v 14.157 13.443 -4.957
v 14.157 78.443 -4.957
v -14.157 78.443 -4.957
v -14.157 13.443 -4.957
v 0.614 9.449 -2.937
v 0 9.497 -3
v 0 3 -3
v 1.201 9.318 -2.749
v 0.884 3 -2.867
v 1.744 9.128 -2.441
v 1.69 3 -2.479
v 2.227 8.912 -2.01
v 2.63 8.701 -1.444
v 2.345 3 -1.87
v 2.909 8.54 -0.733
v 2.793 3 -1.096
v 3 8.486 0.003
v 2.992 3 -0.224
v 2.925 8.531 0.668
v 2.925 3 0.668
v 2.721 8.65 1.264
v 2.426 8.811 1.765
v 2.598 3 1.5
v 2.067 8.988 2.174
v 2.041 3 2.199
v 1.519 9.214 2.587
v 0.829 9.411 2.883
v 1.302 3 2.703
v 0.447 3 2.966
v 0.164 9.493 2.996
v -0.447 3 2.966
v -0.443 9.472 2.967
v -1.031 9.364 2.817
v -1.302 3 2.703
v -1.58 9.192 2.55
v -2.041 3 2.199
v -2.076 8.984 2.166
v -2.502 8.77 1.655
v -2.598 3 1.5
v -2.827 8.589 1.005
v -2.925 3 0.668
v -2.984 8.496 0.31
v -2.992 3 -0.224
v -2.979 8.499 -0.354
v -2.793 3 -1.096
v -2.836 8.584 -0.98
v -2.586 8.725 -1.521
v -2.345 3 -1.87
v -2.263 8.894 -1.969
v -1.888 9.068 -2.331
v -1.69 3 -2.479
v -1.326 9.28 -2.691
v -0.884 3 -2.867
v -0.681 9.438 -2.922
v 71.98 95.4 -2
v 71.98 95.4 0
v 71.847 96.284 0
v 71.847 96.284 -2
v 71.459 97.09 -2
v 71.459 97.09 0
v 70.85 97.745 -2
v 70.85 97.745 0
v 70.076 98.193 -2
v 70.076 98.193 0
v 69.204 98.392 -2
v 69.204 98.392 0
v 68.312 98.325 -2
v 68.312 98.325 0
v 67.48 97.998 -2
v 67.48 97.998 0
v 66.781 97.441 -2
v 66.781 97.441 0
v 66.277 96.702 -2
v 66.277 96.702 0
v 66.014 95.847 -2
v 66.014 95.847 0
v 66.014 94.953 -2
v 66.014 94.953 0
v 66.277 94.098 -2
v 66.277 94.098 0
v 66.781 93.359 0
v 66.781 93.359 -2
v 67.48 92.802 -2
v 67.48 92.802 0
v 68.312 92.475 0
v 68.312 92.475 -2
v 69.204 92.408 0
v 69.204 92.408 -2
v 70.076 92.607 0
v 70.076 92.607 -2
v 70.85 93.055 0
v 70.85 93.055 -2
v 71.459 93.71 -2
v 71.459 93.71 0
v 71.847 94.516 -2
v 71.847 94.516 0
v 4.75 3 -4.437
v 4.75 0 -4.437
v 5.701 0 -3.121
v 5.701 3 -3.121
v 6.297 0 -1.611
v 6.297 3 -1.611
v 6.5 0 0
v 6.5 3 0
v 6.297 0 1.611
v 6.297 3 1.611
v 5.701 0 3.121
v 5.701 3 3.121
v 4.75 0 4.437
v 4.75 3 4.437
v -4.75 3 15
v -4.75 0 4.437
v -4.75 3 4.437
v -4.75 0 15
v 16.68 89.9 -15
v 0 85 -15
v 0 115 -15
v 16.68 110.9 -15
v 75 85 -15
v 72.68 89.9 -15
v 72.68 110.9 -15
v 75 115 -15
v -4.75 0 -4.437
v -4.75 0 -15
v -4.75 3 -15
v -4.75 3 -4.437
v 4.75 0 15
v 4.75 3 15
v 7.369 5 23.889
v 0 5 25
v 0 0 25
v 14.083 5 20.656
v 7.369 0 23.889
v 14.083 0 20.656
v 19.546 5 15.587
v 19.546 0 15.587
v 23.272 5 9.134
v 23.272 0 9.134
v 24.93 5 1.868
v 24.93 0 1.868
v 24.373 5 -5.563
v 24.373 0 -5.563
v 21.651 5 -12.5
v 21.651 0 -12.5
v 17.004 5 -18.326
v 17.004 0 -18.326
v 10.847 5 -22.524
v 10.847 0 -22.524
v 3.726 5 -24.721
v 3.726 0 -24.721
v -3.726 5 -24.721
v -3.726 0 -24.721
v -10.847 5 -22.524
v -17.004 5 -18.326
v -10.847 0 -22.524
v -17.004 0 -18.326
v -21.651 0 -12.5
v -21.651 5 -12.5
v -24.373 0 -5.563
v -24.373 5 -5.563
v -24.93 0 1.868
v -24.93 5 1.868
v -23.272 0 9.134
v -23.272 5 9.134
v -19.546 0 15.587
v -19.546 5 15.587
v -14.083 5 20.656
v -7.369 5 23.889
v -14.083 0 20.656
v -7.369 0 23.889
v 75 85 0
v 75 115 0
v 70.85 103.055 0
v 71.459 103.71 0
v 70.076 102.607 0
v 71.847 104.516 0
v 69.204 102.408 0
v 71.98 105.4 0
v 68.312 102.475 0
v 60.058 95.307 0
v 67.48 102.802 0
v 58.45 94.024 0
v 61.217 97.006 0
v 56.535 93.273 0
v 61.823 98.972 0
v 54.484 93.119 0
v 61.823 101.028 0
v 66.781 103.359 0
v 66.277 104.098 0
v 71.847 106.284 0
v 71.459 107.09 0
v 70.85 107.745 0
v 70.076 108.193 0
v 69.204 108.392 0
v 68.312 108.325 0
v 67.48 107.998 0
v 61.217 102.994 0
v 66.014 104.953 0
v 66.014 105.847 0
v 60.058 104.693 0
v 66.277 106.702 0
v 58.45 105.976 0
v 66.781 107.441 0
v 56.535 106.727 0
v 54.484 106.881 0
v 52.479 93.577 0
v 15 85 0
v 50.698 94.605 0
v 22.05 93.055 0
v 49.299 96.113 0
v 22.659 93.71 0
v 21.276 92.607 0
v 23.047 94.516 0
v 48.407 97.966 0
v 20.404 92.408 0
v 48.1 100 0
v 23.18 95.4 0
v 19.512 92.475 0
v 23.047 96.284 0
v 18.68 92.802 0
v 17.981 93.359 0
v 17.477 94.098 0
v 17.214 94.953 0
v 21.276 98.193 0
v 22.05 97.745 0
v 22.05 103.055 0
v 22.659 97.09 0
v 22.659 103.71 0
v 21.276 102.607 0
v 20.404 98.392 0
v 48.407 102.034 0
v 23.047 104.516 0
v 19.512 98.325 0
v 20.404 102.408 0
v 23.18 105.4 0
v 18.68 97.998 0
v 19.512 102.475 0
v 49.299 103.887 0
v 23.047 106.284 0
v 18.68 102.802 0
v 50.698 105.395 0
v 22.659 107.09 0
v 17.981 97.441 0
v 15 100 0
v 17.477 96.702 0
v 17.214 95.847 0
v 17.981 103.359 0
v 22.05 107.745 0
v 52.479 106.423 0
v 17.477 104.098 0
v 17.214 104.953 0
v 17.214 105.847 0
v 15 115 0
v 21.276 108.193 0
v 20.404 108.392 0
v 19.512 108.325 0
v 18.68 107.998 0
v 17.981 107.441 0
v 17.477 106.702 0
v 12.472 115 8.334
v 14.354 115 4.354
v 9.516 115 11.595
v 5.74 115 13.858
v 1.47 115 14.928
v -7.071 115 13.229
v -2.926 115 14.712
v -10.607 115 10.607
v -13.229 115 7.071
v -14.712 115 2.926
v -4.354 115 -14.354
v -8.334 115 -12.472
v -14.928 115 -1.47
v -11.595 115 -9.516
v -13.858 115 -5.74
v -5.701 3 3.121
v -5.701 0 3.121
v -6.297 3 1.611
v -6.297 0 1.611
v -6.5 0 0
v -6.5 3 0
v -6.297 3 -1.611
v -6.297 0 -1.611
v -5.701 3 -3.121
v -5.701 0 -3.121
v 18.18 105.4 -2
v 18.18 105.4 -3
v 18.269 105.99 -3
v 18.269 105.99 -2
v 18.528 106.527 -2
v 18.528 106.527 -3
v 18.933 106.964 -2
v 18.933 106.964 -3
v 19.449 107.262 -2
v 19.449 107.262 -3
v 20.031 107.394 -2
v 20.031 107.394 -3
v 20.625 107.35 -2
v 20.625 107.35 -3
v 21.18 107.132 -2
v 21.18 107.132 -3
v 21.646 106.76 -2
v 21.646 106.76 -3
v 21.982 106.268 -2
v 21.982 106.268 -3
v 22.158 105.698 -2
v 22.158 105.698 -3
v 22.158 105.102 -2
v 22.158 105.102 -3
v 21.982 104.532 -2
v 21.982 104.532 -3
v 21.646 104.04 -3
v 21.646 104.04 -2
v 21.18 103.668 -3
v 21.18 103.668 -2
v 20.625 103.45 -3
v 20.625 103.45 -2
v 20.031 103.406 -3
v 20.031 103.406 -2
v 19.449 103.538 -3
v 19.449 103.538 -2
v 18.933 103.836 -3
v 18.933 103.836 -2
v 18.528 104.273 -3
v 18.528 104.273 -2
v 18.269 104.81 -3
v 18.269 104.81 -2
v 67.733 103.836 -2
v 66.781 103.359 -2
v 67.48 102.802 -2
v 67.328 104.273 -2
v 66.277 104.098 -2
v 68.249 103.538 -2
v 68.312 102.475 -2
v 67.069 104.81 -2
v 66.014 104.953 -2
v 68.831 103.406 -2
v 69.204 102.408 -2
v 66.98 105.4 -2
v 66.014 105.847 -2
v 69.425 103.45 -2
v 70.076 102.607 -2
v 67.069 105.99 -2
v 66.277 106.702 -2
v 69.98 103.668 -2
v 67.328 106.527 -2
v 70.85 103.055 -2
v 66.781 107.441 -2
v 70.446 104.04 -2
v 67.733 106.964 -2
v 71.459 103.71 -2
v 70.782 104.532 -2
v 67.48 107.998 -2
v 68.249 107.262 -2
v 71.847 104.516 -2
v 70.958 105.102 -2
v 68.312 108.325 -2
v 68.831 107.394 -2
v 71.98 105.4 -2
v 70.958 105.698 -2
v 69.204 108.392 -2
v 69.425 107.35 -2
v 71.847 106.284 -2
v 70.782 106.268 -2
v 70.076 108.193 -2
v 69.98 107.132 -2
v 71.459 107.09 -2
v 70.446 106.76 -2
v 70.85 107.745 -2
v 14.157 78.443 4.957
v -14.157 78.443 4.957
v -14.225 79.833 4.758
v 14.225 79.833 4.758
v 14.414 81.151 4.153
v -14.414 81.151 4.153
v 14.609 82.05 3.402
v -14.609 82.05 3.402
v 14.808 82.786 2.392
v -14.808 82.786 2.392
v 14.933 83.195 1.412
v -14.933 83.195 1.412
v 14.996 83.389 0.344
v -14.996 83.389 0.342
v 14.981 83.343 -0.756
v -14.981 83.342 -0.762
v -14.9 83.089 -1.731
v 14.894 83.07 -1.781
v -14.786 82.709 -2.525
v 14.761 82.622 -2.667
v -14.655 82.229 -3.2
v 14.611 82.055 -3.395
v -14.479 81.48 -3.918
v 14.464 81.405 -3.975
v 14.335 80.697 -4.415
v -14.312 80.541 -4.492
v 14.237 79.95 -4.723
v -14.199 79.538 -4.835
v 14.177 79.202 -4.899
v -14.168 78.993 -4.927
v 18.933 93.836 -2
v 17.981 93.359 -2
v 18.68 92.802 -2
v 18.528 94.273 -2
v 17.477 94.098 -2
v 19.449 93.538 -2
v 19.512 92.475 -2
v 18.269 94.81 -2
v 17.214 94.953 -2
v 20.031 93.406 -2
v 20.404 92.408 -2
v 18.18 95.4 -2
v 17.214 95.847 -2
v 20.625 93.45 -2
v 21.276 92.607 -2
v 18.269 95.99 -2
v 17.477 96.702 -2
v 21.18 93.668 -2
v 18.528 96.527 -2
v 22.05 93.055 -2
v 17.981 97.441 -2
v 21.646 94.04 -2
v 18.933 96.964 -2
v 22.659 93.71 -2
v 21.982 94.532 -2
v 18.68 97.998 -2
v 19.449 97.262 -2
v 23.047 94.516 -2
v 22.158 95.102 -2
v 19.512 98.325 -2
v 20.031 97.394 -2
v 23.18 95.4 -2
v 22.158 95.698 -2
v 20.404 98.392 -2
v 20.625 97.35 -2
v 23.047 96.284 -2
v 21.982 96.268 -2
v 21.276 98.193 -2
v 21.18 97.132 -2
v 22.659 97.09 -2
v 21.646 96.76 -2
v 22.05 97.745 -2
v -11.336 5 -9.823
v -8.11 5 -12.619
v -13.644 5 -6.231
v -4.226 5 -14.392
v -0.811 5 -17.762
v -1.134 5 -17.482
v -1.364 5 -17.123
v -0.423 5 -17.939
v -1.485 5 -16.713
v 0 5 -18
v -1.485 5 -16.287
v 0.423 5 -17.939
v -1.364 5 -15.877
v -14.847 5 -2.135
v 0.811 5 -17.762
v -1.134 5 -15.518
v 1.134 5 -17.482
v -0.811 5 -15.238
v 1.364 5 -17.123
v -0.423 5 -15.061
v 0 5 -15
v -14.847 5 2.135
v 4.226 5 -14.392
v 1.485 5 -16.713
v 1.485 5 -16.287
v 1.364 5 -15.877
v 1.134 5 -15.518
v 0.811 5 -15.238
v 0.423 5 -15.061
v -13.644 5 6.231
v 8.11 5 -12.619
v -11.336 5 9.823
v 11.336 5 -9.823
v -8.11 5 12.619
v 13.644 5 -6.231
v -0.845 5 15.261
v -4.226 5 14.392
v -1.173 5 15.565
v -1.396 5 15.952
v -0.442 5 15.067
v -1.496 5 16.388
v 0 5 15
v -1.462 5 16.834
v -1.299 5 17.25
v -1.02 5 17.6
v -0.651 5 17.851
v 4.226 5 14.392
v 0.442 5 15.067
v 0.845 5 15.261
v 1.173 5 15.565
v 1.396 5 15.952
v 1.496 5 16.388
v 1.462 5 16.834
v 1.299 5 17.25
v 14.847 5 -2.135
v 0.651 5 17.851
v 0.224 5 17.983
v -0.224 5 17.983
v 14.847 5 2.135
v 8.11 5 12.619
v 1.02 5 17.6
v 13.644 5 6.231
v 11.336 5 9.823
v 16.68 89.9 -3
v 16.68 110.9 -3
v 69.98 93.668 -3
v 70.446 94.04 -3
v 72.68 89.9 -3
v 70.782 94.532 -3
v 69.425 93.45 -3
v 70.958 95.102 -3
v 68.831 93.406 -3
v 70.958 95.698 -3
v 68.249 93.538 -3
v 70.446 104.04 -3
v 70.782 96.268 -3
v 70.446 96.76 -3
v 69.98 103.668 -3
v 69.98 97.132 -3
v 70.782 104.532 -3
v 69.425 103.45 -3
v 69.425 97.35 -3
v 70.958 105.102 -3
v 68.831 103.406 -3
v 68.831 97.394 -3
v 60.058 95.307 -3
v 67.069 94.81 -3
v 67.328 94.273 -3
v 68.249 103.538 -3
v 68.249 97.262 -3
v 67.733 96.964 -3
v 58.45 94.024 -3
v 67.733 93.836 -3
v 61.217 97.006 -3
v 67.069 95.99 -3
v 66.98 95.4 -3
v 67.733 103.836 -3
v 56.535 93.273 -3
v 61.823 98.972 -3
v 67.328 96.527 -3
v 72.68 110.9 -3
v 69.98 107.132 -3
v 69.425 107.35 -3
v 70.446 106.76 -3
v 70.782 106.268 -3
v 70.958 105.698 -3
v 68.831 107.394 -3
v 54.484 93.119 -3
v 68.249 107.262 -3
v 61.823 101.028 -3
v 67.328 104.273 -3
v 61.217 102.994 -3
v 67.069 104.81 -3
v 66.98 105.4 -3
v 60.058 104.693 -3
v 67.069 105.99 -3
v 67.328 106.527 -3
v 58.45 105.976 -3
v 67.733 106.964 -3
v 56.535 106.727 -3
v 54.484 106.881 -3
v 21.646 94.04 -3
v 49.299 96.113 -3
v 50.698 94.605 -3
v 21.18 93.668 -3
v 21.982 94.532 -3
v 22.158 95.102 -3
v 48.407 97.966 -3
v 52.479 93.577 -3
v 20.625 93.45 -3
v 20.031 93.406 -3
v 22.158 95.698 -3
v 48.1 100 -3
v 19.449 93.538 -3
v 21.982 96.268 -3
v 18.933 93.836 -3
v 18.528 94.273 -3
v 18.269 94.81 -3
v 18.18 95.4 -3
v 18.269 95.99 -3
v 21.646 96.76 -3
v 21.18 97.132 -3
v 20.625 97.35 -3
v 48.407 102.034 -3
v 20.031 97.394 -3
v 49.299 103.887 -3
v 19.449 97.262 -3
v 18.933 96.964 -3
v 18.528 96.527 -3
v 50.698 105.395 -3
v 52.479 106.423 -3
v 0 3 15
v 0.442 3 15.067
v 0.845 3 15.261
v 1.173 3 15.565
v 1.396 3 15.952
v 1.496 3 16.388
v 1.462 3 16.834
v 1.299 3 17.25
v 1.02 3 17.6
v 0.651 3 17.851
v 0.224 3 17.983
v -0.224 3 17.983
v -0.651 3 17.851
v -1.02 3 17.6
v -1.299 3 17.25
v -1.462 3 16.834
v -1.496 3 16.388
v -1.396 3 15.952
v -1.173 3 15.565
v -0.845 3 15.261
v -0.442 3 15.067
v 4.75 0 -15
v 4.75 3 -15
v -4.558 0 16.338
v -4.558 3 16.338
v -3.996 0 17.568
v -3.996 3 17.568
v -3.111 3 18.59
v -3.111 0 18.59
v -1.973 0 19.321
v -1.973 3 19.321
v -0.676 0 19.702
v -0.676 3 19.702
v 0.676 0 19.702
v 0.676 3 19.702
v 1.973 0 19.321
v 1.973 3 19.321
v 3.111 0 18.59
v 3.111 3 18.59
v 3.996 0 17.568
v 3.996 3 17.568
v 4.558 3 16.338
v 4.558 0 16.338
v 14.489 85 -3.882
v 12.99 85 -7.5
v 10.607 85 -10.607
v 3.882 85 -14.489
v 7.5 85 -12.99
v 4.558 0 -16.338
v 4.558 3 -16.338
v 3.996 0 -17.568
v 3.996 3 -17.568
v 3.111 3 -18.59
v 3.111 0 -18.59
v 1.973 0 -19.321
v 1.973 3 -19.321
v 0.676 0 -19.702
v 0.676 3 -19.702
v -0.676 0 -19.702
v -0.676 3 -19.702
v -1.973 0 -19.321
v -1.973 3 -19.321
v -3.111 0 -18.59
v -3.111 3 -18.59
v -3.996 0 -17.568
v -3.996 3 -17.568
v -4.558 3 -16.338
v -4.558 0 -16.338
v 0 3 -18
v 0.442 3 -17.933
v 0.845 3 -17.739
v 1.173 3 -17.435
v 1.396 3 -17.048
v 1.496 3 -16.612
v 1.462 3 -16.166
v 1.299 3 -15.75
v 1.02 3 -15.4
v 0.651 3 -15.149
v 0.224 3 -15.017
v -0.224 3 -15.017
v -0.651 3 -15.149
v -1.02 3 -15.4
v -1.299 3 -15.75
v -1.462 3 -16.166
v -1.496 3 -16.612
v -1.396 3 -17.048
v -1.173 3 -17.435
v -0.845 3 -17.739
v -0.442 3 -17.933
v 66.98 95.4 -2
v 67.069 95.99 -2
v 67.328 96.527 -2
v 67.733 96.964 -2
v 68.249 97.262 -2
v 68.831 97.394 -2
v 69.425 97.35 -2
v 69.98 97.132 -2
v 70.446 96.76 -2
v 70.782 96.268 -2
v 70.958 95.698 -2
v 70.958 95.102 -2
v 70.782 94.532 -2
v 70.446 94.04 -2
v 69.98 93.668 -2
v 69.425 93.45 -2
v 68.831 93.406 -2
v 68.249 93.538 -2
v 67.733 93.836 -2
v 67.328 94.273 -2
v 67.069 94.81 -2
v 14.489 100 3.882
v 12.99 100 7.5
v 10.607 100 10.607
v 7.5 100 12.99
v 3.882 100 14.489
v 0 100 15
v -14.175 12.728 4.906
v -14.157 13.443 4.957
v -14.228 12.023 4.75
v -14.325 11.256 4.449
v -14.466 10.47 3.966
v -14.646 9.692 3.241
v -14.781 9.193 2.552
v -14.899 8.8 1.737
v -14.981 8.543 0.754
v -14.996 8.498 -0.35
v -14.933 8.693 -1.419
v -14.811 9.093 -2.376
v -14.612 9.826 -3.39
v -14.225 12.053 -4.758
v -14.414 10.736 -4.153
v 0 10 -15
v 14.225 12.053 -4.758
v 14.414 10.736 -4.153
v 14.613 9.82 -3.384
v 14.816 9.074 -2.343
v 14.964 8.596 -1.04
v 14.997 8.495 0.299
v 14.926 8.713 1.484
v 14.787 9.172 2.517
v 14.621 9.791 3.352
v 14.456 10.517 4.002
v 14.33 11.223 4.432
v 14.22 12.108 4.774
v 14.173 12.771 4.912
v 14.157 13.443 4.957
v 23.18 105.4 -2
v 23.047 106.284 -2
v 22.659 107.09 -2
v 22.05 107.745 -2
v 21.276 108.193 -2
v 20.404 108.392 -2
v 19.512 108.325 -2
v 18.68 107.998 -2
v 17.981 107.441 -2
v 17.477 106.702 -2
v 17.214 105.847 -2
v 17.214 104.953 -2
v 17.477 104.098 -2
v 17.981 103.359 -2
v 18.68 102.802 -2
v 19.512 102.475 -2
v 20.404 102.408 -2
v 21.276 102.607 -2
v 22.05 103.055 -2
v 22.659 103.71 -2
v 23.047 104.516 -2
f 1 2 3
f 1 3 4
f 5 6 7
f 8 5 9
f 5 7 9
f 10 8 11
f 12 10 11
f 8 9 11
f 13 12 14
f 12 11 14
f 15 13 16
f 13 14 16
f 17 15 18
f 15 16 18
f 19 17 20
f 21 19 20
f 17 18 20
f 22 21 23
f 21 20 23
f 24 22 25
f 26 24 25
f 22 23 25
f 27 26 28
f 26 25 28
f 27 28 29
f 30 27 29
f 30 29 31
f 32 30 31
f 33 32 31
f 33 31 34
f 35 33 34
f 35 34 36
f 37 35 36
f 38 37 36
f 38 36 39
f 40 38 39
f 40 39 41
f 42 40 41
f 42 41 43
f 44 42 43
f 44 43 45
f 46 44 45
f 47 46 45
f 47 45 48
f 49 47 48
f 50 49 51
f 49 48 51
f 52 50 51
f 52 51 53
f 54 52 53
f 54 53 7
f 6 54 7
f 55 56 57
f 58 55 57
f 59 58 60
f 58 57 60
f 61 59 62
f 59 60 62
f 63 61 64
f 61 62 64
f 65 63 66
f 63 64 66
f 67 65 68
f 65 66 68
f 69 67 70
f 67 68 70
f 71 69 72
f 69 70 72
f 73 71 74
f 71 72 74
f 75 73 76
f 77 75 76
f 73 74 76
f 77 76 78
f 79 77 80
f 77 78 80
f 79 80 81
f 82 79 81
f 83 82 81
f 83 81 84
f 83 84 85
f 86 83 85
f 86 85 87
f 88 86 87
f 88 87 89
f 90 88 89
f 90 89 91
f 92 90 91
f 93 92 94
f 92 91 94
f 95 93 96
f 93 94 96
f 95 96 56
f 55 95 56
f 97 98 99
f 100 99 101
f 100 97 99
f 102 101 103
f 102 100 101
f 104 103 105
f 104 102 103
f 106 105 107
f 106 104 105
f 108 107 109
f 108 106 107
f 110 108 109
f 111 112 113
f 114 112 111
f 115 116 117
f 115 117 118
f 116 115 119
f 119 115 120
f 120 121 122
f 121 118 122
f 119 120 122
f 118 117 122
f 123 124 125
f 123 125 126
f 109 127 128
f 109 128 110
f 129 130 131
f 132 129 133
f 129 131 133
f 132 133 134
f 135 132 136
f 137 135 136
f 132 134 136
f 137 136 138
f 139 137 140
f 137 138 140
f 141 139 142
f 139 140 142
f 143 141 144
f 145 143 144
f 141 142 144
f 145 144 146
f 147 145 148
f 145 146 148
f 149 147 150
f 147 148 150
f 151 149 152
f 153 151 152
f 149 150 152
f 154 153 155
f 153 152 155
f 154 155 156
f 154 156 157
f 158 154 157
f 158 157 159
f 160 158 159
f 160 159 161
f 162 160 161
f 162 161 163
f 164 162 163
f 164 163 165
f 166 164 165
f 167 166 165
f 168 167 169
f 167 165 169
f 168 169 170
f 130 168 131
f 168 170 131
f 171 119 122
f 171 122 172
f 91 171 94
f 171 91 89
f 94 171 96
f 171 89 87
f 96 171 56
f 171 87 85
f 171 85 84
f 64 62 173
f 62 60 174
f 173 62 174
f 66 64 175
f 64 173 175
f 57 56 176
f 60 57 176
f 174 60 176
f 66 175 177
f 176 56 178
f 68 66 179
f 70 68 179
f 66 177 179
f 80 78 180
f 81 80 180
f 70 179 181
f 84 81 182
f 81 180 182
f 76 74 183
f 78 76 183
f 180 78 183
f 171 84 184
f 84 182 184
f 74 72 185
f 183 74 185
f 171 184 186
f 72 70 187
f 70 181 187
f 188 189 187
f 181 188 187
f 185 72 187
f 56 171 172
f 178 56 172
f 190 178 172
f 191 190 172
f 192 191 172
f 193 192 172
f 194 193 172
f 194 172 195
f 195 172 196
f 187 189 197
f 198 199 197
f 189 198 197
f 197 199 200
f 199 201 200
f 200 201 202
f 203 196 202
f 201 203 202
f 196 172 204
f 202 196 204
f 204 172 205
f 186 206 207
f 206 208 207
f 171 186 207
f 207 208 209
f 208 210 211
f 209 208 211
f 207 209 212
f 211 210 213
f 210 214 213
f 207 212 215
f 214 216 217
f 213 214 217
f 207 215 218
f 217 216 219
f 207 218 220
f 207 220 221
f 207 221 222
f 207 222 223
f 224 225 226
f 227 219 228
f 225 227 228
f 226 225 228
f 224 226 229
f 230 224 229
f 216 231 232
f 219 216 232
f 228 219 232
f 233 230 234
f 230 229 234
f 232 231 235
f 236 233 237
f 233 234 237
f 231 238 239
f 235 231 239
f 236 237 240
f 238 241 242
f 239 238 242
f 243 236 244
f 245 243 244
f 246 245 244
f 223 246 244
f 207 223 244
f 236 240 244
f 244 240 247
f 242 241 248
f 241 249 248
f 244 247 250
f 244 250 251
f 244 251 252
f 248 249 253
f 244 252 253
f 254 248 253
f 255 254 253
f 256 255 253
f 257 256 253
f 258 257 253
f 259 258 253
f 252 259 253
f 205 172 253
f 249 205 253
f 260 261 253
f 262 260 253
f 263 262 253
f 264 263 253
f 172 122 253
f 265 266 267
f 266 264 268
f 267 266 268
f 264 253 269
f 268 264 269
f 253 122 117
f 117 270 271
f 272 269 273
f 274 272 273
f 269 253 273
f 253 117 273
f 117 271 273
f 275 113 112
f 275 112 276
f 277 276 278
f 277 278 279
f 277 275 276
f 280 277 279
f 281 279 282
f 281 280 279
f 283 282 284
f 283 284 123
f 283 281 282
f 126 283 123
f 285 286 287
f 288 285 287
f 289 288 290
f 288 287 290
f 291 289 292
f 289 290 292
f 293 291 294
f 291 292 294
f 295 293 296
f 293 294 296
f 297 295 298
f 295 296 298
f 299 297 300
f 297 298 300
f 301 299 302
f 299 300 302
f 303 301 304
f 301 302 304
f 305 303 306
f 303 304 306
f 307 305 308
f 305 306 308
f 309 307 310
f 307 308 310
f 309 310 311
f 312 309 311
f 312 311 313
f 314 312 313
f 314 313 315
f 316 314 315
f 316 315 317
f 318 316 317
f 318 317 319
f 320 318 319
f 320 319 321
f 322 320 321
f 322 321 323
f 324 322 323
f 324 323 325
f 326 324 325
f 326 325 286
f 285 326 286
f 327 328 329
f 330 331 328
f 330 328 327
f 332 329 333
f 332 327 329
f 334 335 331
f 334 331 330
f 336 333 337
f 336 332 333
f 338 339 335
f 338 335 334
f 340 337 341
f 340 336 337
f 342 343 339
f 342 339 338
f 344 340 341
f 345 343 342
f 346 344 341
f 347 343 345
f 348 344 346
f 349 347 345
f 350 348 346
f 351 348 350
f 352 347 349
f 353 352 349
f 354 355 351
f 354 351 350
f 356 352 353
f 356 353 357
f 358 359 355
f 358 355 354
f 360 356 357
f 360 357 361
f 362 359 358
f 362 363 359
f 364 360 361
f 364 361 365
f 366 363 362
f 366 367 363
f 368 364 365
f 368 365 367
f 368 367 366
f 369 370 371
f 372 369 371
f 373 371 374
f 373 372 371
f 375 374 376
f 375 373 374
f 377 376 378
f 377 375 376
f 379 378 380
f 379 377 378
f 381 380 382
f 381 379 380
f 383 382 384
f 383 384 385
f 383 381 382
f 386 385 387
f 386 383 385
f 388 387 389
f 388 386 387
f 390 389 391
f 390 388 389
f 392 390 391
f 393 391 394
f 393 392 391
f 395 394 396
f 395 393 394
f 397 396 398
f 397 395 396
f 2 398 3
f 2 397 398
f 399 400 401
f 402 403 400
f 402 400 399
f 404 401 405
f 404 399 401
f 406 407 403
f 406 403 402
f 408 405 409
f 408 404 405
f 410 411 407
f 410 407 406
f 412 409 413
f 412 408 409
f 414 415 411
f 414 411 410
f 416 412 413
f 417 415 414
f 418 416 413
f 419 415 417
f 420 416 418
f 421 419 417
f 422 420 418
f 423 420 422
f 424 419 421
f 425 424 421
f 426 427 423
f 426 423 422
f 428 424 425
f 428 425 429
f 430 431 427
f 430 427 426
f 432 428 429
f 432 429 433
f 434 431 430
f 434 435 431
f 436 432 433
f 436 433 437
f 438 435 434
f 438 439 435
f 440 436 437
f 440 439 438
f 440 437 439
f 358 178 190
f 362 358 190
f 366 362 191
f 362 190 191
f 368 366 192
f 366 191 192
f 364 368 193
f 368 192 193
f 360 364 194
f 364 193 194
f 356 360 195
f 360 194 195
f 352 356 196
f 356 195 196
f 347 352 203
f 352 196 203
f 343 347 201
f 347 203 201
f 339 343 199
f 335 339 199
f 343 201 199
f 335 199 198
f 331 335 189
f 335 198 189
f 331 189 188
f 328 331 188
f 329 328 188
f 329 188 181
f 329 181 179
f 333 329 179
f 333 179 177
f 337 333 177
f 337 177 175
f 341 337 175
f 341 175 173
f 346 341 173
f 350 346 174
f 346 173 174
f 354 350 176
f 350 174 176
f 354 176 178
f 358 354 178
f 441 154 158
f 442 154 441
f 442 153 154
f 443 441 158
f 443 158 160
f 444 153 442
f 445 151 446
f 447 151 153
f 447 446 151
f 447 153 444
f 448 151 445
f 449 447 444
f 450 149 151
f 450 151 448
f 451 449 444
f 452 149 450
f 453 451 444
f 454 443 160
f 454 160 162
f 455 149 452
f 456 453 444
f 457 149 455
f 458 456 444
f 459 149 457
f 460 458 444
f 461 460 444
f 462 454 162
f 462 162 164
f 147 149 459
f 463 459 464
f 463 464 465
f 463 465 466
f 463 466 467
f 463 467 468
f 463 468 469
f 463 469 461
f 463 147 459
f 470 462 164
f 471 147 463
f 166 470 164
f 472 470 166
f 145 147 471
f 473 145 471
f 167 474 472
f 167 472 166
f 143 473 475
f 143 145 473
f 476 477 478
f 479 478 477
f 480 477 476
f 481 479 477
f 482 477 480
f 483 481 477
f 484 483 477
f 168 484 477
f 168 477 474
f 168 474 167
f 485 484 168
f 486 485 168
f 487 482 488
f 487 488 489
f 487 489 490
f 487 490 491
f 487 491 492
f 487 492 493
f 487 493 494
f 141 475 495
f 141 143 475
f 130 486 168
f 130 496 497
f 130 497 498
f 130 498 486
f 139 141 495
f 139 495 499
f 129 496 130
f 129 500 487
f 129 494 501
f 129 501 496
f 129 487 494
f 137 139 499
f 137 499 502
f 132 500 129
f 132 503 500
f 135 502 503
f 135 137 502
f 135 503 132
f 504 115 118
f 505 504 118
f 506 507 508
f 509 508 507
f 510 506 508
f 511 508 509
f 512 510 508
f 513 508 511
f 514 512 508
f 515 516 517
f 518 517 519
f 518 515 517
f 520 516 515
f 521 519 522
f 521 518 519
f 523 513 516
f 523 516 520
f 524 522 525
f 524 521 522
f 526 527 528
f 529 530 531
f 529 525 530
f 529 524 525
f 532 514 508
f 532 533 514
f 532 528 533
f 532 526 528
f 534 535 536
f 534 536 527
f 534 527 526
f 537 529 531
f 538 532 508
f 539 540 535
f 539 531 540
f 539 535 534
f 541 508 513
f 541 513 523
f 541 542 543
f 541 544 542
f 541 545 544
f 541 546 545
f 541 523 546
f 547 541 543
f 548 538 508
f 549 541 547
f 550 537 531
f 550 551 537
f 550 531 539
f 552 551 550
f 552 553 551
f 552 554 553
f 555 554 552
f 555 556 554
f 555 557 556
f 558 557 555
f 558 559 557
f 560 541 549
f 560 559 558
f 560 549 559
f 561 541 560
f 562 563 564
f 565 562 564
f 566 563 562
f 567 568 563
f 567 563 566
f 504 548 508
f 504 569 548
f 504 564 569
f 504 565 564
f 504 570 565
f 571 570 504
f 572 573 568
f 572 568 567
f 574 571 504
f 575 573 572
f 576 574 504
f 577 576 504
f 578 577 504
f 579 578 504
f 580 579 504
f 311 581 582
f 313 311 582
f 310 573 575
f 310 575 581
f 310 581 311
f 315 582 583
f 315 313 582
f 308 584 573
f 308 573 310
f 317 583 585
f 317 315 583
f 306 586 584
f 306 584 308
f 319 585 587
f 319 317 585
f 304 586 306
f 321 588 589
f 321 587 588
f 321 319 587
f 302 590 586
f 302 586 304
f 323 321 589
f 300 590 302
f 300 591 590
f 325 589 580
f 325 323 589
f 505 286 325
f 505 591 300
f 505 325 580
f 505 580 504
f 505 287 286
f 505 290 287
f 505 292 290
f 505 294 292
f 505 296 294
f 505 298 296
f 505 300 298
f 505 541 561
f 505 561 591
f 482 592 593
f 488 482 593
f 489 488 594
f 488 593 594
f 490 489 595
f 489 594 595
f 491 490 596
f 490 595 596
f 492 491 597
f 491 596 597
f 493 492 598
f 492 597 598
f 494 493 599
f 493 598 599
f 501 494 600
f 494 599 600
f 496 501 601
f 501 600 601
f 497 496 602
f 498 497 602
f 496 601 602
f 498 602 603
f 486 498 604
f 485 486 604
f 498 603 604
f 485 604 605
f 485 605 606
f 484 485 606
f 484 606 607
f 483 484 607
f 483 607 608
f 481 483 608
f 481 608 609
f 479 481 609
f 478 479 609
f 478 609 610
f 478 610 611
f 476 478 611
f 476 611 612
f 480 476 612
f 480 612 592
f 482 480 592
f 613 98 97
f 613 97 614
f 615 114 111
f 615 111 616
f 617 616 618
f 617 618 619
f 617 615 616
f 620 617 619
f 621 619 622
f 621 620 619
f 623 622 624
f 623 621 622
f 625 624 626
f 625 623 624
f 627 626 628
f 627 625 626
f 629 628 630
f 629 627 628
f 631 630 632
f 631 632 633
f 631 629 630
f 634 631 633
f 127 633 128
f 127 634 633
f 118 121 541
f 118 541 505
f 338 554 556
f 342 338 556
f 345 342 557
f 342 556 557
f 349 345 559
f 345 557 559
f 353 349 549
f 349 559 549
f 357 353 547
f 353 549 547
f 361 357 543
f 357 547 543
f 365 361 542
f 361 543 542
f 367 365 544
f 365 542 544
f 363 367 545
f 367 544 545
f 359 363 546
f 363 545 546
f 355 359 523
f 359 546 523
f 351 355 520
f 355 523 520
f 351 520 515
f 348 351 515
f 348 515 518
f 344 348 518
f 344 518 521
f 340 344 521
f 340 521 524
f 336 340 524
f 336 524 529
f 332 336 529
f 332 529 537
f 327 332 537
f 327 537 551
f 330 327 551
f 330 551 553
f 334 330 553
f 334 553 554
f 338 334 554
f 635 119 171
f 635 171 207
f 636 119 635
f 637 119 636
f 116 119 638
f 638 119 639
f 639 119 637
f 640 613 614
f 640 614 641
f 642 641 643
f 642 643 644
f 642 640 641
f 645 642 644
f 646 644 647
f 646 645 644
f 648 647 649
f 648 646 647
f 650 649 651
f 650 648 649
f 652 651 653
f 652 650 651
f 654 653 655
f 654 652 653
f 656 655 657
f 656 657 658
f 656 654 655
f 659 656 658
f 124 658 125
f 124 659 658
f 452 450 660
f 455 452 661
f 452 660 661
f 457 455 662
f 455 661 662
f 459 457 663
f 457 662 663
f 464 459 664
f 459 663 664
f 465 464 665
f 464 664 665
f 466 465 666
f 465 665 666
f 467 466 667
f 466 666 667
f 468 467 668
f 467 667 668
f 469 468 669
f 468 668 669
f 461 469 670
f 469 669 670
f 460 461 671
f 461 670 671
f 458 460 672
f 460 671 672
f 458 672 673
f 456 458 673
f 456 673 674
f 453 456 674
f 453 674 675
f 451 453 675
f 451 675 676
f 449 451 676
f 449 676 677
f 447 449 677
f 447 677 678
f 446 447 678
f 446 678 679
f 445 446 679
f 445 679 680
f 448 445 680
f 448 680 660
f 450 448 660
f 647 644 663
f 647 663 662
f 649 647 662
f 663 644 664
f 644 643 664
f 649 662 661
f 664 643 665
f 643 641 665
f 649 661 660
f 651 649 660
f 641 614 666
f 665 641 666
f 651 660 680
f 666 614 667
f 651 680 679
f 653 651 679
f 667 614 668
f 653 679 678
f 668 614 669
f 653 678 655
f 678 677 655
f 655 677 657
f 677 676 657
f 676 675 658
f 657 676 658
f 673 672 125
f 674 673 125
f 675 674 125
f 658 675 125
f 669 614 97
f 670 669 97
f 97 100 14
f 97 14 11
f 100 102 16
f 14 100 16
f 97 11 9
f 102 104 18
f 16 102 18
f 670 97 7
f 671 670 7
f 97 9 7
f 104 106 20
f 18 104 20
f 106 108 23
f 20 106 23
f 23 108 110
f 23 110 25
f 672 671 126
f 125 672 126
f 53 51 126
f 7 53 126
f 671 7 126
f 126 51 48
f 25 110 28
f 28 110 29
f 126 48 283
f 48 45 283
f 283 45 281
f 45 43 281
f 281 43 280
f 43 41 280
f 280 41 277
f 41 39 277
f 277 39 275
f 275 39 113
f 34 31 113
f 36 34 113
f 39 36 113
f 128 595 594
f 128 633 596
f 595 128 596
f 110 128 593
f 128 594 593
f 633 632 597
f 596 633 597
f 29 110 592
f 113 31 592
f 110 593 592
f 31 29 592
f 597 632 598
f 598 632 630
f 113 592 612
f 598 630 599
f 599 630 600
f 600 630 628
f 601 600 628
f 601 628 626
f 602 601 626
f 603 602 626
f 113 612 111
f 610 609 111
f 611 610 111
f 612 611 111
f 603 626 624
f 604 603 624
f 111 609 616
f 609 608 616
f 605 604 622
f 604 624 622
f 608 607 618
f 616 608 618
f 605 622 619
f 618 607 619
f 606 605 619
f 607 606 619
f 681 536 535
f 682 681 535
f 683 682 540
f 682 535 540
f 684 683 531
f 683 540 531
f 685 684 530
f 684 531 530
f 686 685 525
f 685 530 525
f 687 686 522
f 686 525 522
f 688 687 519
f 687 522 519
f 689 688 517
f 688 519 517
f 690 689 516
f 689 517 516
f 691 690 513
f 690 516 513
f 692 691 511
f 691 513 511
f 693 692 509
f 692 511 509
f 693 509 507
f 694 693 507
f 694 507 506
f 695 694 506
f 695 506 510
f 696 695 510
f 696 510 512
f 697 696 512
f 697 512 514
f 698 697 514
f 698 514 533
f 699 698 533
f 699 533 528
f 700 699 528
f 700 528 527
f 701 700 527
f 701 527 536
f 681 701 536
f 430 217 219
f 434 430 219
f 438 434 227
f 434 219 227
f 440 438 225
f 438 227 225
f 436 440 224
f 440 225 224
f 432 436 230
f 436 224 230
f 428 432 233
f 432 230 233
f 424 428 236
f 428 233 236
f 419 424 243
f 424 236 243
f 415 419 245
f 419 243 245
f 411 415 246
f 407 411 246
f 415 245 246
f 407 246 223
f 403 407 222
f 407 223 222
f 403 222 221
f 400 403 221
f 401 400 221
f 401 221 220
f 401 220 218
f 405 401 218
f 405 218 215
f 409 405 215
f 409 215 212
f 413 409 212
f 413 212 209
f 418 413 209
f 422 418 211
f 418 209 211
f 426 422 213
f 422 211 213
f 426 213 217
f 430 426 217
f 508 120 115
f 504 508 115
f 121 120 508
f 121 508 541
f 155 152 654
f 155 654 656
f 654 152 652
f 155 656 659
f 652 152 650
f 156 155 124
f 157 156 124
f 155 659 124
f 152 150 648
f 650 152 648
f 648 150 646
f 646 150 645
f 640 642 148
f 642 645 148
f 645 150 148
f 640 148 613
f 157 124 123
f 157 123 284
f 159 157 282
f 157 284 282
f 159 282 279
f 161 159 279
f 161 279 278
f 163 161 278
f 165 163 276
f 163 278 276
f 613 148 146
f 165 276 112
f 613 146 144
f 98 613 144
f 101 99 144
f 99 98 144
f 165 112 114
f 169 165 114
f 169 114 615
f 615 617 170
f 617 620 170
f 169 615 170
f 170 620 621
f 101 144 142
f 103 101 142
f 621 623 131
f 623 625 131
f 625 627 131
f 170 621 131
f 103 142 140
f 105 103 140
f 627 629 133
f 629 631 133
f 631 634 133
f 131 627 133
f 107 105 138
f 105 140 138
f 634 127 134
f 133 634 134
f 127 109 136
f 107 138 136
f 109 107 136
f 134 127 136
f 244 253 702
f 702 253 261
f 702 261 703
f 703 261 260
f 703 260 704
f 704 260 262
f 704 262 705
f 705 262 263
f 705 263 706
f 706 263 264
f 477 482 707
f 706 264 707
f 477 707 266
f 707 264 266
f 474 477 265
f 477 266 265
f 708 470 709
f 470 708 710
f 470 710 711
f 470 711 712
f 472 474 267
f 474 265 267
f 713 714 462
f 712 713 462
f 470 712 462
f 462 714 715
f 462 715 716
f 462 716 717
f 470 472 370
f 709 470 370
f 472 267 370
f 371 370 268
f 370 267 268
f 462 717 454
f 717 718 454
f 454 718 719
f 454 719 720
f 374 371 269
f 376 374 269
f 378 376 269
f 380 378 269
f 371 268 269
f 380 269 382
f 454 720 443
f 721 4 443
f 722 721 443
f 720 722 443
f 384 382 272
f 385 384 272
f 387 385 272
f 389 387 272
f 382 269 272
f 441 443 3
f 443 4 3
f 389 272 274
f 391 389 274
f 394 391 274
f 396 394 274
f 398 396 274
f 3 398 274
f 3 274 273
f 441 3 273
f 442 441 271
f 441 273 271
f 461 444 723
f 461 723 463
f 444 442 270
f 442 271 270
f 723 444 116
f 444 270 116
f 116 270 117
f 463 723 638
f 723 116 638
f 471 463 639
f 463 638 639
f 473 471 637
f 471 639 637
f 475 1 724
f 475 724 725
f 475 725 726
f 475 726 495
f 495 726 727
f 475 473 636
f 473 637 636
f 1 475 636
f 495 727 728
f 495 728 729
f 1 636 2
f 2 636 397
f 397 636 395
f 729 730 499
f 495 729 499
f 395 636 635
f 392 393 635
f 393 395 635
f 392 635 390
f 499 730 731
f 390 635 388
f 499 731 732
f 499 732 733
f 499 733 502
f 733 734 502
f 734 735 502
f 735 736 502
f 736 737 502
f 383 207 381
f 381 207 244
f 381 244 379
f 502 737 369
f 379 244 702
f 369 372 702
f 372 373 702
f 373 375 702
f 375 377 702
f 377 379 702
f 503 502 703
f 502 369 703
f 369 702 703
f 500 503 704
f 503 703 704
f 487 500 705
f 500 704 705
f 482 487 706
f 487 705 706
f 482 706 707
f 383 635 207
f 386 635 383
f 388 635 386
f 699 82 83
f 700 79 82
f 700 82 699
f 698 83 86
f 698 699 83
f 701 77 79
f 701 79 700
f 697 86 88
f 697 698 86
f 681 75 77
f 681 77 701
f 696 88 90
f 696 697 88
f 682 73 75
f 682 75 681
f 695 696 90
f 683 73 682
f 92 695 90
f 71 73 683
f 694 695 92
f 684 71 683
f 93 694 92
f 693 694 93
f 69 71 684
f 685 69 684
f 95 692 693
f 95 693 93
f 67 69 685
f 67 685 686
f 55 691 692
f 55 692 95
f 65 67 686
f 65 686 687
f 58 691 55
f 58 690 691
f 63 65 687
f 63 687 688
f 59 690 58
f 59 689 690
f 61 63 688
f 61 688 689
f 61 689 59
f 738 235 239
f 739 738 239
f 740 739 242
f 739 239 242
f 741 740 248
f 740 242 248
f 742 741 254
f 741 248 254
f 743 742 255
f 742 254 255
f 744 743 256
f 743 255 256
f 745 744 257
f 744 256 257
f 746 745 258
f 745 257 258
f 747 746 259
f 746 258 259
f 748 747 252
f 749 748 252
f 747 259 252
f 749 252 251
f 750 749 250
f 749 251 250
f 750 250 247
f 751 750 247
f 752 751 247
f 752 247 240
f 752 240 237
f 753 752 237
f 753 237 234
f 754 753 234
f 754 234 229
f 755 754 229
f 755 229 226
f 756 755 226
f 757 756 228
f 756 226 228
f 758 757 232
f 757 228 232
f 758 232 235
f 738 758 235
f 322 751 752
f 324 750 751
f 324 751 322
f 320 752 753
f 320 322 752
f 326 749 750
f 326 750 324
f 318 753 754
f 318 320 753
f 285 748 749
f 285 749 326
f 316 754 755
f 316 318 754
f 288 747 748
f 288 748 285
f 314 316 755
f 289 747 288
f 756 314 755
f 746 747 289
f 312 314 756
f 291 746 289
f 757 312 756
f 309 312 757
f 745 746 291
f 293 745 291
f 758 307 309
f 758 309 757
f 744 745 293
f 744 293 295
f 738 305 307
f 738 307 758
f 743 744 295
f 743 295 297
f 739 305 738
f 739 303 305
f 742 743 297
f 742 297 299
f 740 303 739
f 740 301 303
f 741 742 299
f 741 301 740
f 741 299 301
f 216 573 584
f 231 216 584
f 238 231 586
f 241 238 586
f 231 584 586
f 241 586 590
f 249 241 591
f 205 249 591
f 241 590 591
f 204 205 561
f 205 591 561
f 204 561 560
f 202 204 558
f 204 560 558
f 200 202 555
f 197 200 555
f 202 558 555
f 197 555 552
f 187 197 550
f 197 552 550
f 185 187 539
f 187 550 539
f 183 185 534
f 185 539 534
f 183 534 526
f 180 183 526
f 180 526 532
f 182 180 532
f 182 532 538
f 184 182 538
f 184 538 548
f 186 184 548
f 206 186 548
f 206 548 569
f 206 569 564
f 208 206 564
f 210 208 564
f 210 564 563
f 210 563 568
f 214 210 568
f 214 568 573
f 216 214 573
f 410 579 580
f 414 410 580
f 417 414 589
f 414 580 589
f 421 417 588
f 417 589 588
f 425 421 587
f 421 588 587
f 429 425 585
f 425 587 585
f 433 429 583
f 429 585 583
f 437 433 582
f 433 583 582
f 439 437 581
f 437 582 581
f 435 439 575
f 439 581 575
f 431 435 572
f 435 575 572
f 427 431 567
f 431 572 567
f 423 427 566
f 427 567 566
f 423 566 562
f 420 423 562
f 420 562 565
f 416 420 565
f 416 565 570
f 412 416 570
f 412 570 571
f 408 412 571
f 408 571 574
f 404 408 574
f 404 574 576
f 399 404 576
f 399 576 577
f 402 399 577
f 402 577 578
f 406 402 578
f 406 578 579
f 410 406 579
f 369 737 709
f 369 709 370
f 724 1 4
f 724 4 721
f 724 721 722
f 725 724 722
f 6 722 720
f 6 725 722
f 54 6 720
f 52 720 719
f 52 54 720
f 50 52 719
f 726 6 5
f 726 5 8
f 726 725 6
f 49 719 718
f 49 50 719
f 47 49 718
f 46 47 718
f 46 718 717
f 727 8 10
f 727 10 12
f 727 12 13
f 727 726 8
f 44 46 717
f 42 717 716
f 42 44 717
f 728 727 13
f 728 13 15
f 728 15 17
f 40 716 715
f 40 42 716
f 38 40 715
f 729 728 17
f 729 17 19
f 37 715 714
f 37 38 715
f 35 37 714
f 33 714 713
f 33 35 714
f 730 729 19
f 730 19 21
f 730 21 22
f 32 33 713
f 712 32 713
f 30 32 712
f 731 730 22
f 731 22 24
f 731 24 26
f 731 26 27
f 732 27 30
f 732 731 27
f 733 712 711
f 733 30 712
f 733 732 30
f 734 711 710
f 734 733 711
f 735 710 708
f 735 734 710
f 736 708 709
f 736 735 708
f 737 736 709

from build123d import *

# Parameters (mm, degrees)
SKETCH1_R           = 25
BOSS_EXTRUDE1_DEPTH = 5
SKETCH2_R           = 15
BOSS_EXTRUDE2_DEPTH = 95
BOSS_EXTRUDE4_DEPTH = 15
CUT_EXTRUDE1_DEPTH  = 20
SKETCH15_W          = 56
SKETCH15_H          = 21
CUT_EXTRUDE3_DEPTH  = 12
SKETCH17_R          = 2
SKETCH17_R_2        = 6.9
CUT_EXTRUDE4_DEPTH  = 5
SKETCH20_R          = 3
CUT_EXTRUDE5_DEPTH  = 2
SKETCH22_R          = 3
SKETCH22_R_2        = 1.5
CUT_EXTRUDE6_DEPTH  = 10
CUT_EXTRUDE7_DEPTH  = 3
SKETCH24_R          = 6.5
CUT_EXTRUDE8_DEPTH  = 3


with BuildPart() as part:
    # Sketch1 → Boss-Extrude1 (new body)
    with BuildSketch(Plane(origin=(0, 0, 0), x_dir=(1, 0, 0), z_dir=(0, 1, 0))):
        with Locations(Location((0, 0, 0), (0, 0, 270))):
            Circle(SKETCH1_R)
    extrude(amount=BOSS_EXTRUDE1_DEPTH)

    # Sketch2 → Boss-Extrude2 (add)
    with BuildSketch(Plane(origin=(0, 5, 0), x_dir=(1, 0, 0), z_dir=(0, 1, 0))):
        with Locations(Location((0, 0, 0), (0, 0, 270))):
            Circle(SKETCH2_R)
    extrude(amount=BOSS_EXTRUDE2_DEPTH)

    # Sketch5 → Boss-Extrude4 (add, symmetric)
    with BuildSketch(Plane(origin=(0, 100, 0), x_dir=(1, 0, 0), z_dir=(0, 1, 0))):
        with BuildLine():
            Line((75, 0), (15, 0))
            ThreePointArc((15, 0), (-10.606601718, -10.606601718), (0, 15))
            Line((0, 15), (75, 15))
            Line((75, 15), (75, 0))
        make_face()
    extrude(amount=BOSS_EXTRUDE4_DEPTH, both=True)

    # Sketch13 → Cut-Extrude1 (cut, symmetric)
    with BuildSketch(Plane(origin=(0, 0, 0), x_dir=(0, 0, -1), z_dir=(1, 0, 0))):
        with BuildLine():
            Line((4.957382287, 78.443263872), (4.957382287, 13.443263872))
            ThreePointArc((4.957382287, 13.443263872), (0, 8.485881586), (-4.957382287, 13.443263872))
            Line((-4.957382287, 13.443263872), (-4.957382287, 78.443263872))
            ThreePointArc((-4.957382287, 78.443263872), (0, 83.400646159), (4.957382287, 78.443263872))
        make_face()
    extrude(amount=CUT_EXTRUDE1_DEPTH, both=True, mode=Mode.SUBTRACT)

    # Sketch15 → Cut-Extrude3 (cut)
    with BuildSketch(Plane(origin=(0, 0, -15), x_dir=(-1, 0, 0), z_dir=(0, 0, -1))):
        with Locations((-44.68, 100.4)):
            Rectangle(SKETCH15_W, SKETCH15_H)
    extrude(amount=-CUT_EXTRUDE3_DEPTH, mode=Mode.SUBTRACT)

    # Sketch17 → Cut-Extrude4 (cut)
    with BuildSketch(Plane(origin=(0, 0, -3), x_dir=(-1, 0, 0), z_dir=(0, 0, -1))):
        with Locations((-68.98, 105.4)):
            Circle(SKETCH17_R)
        with Locations((-68.98, 95.4)):
            Circle(SKETCH17_R)
        with Locations((-20.18, 105.4)):
            Circle(SKETCH17_R)
        with Locations((-20.18, 95.4)):
            Circle(SKETCH17_R)
        with Locations((-55, 100)):
            Circle(SKETCH17_R_2)
    extrude(amount=-CUT_EXTRUDE4_DEPTH, mode=Mode.SUBTRACT)

    # Sketch20 → Cut-Extrude5 (cut)
    with BuildSketch(Plane.XY):
        with Locations((20.18, 105.4)):
            Circle(SKETCH20_R)
        with Locations((20.18, 95.4)):
            Circle(SKETCH20_R)
        with Locations((68.98, 105.4)):
            Circle(SKETCH20_R)
        with Locations((68.98, 95.4)):
            Circle(SKETCH20_R)
    extrude(amount=-CUT_EXTRUDE5_DEPTH, mode=Mode.SUBTRACT)

    # Sketch22 → Cut-Extrude6 (cut)
    with BuildSketch(Plane.XZ):
        with Locations(Location((0, 0, 0), (0, 0, 270))):
            Circle(SKETCH22_R)
        with Locations(Location((0, 16.5, 0), (0, 0, 270))):
            Circle(SKETCH22_R_2)
        with Locations(Location((0, -16.5, 0), (0, 0, 270))):
            Circle(SKETCH22_R_2)
    extrude(amount=-CUT_EXTRUDE6_DEPTH, mode=Mode.SUBTRACT)

    # Sketch23 → Cut-Extrude7 (cut)
    with BuildSketch(Plane.XZ):
        with BuildLine():
            Line((4.75, 15), (4.75, -15))
            ThreePointArc((4.75, -15), (0, -19.75), (-4.75, -15))
            Line((-4.75, -15), (-4.75, 15))
            ThreePointArc((-4.75, 15), (0, 19.75), (4.75, 15))
        make_face()
    extrude(amount=-CUT_EXTRUDE7_DEPTH, mode=Mode.SUBTRACT)

    # Sketch24 → Cut-Extrude8 (cut)
    with BuildSketch(Plane.XZ.offset(-3)):
        Circle(SKETCH24_R)
    extrude(amount=CUT_EXTRUDE8_DEPTH, mode=Mode.SUBTRACT)


solid = part.part
